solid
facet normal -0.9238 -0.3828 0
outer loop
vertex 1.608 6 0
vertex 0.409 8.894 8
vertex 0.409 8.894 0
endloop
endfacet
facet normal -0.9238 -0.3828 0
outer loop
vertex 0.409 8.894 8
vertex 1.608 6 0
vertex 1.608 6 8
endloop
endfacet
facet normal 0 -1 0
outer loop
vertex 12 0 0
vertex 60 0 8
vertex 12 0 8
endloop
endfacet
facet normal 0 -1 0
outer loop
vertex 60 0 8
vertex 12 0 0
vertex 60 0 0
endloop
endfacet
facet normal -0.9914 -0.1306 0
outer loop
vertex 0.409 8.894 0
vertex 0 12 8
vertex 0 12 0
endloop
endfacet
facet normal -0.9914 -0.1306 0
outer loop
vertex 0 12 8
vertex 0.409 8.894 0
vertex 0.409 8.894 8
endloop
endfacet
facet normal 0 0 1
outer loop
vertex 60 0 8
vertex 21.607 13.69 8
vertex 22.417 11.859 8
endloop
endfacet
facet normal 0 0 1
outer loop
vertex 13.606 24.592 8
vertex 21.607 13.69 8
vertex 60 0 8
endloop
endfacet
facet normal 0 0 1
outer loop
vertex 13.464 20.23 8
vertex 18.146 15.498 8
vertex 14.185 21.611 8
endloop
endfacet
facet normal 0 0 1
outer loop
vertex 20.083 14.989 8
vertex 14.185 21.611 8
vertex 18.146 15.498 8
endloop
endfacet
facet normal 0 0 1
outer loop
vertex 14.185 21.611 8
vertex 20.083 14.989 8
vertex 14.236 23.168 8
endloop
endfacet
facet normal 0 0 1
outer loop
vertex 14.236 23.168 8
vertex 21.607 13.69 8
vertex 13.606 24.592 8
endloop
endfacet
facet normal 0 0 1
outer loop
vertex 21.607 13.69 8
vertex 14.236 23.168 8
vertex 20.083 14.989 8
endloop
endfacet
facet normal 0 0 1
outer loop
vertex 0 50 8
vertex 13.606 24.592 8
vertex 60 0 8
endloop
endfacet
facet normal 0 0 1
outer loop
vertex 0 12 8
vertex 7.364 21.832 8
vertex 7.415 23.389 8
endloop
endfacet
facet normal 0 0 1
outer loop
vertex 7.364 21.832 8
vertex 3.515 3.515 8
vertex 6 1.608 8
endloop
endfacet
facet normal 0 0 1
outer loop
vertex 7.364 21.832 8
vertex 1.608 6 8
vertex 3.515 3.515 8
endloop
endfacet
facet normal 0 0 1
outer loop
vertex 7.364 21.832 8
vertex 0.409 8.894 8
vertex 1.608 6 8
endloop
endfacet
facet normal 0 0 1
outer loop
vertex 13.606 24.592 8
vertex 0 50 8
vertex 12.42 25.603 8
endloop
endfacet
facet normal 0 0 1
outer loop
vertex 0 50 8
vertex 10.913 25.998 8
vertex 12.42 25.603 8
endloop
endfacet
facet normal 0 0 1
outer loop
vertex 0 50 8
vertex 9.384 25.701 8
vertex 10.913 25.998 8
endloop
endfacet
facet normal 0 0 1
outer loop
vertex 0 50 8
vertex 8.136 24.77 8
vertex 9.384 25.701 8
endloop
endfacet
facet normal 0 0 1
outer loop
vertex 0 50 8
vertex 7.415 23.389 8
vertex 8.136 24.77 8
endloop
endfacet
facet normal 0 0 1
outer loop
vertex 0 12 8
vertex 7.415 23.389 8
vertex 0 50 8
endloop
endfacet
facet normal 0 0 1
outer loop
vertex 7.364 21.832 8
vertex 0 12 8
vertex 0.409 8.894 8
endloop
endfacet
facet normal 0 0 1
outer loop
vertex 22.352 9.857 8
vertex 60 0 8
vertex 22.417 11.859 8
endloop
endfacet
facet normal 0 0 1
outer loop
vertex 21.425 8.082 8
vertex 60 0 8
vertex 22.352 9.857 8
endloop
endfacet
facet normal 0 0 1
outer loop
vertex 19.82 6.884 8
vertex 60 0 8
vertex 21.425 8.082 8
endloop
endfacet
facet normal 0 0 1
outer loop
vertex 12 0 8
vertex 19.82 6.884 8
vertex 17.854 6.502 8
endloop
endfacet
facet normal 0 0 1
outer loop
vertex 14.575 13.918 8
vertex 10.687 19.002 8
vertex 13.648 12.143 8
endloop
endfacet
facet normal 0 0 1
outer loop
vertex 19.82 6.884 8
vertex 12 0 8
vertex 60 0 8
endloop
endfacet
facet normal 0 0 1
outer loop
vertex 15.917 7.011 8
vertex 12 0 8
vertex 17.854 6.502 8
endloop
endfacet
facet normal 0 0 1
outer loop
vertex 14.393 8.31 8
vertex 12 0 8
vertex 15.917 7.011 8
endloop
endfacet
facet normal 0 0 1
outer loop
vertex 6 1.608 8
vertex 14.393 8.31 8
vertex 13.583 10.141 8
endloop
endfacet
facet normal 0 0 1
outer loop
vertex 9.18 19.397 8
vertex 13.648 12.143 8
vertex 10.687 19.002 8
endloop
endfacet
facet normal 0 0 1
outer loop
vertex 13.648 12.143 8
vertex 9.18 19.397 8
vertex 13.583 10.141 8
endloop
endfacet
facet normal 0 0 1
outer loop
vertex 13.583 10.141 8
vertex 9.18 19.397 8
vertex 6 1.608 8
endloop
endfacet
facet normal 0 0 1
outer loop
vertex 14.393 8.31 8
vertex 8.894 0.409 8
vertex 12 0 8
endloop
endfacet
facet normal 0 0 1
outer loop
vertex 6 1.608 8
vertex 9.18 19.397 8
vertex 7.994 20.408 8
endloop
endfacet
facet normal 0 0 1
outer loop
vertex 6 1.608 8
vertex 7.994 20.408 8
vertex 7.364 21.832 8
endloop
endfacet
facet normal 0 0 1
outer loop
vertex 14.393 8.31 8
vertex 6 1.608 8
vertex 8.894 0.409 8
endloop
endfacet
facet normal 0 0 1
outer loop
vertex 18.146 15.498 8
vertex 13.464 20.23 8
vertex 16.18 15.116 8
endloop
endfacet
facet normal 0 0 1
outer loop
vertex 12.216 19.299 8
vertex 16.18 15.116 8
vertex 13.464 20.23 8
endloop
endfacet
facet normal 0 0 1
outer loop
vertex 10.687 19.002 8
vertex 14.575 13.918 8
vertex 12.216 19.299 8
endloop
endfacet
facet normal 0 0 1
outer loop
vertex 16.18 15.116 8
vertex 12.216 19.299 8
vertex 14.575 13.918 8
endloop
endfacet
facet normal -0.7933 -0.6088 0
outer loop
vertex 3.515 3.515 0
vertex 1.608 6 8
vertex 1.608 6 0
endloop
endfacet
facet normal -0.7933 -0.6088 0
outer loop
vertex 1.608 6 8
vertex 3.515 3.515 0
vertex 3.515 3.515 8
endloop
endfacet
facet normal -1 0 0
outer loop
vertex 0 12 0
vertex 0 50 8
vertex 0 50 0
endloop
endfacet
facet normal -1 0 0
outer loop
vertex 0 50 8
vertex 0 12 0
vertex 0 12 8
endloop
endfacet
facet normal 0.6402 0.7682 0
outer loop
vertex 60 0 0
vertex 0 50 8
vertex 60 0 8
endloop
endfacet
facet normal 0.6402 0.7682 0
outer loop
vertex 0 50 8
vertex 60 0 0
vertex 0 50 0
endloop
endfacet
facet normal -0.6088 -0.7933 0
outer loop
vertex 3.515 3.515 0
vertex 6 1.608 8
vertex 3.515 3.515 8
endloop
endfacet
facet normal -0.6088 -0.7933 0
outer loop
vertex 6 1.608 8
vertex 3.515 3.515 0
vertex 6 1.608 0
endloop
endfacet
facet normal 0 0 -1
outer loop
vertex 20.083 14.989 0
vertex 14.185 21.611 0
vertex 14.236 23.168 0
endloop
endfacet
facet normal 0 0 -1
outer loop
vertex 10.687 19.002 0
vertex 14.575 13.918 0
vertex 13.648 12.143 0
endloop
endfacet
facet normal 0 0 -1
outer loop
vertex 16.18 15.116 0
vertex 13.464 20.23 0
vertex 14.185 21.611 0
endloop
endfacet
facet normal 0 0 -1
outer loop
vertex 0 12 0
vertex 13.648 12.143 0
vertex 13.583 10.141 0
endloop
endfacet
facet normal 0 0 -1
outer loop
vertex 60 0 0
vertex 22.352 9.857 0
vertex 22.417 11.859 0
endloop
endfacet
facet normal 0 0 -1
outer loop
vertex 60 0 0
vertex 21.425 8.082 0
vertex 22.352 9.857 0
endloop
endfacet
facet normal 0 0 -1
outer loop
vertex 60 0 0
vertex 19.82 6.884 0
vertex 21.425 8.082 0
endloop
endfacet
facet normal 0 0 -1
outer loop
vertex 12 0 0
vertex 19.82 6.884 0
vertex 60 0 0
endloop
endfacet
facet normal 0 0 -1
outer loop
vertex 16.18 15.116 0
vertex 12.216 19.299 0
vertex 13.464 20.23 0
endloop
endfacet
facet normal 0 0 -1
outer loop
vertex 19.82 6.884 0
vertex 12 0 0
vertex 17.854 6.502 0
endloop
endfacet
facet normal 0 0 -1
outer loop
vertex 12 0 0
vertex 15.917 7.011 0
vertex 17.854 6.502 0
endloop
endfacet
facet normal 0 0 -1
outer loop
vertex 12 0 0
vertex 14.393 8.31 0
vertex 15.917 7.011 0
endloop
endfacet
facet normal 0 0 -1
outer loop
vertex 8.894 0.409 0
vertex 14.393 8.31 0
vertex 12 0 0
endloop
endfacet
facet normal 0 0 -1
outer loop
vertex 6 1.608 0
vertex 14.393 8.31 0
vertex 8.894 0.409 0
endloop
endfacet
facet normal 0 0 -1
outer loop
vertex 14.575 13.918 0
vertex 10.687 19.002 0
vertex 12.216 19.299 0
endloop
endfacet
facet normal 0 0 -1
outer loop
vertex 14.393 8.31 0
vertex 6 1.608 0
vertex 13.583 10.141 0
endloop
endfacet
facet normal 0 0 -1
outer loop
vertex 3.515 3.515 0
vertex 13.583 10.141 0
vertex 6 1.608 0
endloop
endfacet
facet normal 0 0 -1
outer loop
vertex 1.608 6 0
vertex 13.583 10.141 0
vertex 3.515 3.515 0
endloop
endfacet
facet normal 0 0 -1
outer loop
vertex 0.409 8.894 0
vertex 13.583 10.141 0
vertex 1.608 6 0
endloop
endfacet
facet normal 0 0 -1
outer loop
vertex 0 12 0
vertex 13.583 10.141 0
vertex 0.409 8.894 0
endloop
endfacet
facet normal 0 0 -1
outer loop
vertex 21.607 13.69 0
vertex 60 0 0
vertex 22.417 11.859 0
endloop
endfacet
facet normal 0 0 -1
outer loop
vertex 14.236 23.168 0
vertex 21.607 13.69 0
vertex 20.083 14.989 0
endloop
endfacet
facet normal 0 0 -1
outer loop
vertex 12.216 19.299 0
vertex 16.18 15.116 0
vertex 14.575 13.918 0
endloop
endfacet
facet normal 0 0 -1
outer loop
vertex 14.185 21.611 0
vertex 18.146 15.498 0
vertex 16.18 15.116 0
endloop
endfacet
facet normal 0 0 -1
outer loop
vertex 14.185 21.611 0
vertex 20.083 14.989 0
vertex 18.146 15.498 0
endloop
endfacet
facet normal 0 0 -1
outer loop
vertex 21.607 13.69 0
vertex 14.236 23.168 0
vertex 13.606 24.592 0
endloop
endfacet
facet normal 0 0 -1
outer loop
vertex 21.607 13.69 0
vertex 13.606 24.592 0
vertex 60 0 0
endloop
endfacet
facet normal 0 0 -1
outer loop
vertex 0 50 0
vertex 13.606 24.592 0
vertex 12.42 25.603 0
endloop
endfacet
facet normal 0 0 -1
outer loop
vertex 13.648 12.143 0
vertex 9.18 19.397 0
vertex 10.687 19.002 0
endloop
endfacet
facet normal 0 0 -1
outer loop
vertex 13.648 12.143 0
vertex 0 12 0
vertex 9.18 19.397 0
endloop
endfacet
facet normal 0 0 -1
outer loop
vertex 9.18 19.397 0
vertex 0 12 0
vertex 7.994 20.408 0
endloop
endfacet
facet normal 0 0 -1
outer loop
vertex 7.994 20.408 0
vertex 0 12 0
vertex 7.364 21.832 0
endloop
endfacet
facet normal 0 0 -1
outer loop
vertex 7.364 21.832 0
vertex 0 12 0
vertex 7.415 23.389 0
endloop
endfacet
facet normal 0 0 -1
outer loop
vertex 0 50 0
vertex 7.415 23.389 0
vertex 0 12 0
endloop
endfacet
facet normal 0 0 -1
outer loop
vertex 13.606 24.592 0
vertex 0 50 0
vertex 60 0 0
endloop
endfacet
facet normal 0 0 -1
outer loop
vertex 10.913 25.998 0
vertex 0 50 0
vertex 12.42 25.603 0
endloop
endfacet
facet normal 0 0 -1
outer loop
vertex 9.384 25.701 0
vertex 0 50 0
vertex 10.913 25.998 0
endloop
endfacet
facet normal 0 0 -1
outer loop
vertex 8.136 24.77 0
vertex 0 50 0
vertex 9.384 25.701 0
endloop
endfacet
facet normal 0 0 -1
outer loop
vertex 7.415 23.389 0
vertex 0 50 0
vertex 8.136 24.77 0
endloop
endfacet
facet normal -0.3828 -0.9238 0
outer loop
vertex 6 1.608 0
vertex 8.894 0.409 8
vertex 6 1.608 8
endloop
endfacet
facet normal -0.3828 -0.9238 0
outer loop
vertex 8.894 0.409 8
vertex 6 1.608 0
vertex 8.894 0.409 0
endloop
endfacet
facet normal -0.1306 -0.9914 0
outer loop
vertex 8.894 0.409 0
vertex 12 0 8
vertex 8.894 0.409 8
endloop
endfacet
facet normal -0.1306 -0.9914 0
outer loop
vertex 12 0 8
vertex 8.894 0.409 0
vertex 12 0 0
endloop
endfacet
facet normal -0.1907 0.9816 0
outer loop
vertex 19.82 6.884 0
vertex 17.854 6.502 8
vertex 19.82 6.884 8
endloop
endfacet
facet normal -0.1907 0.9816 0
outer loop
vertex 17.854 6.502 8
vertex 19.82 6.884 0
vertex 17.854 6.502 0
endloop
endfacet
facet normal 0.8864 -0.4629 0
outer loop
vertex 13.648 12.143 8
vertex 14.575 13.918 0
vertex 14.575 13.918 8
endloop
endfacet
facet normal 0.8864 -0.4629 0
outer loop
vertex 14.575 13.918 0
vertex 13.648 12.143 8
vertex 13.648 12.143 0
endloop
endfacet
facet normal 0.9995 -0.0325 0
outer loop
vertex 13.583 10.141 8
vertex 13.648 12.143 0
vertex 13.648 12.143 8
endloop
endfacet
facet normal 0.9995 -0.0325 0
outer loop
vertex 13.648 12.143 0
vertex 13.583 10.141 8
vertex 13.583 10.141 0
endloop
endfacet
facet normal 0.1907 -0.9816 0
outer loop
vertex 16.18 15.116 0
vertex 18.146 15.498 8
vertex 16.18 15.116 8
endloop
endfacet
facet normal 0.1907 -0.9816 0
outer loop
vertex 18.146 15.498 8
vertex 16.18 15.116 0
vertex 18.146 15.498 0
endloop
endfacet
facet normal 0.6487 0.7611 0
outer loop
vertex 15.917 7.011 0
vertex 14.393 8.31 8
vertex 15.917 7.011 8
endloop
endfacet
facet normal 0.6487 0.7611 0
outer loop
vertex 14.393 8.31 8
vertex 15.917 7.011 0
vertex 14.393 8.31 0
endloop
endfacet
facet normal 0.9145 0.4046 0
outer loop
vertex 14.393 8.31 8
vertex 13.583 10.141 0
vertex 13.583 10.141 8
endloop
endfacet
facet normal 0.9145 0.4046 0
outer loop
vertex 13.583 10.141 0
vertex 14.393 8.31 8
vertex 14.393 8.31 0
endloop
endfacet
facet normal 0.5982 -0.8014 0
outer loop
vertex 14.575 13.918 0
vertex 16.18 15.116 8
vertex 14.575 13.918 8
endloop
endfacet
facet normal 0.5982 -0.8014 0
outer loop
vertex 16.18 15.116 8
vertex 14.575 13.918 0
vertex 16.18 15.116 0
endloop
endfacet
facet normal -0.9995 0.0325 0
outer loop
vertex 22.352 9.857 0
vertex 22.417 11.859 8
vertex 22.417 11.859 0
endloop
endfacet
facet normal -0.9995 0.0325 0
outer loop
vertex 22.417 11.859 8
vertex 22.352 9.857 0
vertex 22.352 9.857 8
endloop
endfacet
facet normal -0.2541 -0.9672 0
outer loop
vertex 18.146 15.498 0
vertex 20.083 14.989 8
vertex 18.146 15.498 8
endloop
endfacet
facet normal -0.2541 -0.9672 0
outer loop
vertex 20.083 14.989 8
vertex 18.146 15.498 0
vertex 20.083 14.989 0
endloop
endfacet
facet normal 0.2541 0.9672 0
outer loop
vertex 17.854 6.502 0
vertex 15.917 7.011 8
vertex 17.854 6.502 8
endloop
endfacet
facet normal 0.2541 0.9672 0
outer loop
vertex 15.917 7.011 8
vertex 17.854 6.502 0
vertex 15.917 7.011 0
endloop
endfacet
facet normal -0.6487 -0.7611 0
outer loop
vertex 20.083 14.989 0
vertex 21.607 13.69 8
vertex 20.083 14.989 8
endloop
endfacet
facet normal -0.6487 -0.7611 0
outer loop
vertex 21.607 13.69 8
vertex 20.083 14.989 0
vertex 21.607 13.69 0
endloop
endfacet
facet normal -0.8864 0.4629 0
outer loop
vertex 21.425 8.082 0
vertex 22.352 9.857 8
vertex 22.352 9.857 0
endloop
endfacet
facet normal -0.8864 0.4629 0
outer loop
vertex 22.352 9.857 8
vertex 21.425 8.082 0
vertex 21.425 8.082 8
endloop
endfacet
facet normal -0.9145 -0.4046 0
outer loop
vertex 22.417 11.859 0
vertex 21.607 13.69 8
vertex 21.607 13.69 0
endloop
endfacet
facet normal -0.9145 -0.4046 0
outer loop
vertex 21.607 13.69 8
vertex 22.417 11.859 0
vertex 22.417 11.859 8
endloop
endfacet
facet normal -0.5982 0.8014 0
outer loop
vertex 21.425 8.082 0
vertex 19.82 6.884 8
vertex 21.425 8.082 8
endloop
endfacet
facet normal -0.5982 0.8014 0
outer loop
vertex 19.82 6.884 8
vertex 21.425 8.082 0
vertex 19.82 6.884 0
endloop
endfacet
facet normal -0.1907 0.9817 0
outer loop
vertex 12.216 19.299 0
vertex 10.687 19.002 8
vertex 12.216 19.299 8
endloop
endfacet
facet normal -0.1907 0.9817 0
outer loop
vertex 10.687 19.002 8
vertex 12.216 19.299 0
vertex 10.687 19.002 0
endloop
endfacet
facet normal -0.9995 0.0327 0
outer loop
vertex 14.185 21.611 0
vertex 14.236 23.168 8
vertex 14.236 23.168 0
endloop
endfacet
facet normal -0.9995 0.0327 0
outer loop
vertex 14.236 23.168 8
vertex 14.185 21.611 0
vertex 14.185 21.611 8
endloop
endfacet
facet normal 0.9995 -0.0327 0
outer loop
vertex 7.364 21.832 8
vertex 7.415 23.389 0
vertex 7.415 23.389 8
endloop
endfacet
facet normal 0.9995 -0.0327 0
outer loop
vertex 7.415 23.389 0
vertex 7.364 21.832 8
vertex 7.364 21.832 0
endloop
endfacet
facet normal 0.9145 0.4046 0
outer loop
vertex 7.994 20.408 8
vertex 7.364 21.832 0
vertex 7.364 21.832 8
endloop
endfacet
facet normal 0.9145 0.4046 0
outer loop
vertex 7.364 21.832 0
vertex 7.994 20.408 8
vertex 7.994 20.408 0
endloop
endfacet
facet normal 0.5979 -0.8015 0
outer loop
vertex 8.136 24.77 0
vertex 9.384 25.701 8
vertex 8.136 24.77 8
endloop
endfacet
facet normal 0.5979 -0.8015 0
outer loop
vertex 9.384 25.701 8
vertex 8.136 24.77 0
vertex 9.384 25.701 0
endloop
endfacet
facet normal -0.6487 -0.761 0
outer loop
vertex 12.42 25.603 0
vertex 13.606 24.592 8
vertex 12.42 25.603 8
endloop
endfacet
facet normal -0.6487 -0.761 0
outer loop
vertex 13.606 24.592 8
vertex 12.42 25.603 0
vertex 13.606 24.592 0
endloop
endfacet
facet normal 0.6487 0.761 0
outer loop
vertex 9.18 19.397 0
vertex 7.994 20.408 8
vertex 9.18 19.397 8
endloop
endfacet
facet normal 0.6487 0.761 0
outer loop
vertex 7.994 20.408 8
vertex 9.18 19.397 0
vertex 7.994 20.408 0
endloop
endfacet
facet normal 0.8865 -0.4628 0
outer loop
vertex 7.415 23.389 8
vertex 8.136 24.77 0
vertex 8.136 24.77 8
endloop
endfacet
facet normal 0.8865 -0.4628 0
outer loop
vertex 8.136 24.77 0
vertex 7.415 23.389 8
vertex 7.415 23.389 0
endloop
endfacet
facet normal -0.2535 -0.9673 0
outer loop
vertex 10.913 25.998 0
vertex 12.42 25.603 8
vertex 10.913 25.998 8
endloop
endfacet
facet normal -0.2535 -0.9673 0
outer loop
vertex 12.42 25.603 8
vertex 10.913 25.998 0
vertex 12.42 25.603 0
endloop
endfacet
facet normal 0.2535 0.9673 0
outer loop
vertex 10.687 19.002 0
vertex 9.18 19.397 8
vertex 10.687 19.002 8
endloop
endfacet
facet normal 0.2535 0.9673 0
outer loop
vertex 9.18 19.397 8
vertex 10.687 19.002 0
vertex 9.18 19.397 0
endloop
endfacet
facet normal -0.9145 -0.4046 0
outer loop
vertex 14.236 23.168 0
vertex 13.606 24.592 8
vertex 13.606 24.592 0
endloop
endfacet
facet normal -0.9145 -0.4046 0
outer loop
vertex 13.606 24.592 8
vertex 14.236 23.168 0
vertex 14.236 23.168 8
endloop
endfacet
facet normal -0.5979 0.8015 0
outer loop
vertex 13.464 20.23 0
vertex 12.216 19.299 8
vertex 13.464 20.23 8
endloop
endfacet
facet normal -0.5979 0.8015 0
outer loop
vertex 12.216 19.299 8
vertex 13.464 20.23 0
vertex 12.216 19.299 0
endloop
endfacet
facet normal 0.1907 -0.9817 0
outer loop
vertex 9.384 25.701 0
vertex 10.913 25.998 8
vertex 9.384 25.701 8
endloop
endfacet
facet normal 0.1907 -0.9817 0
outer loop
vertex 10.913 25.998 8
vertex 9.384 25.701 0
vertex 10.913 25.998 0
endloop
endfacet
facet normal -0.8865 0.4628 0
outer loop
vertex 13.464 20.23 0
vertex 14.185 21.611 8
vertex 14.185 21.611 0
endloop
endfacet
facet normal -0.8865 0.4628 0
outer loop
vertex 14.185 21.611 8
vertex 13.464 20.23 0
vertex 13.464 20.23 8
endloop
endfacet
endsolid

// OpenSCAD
$fn = 32;

// ----------------------------------------------------------------------
// Bracket plate: corner pad 60 x 50, fillet R12
// ----------------------------------------------------------------------

// --- parameters (mm) ---
hole_r = 3.5;             // bolt hole radius
plate_t = 8;              // plate thickness, Z (extrusion height)
leg_a = 60;               // base leg
leg_b = 50;               // height leg
fillet_r = 12;            // right-angle fillet radius
fit_tol = 0.05;           // declared fit tolerance (prompt contract)
free_tol = 0.3;           // declared free tolerance (prompt contract)

hole_d1 = 2 * hole_r + 2;
hole_d2 = 2 * hole_r;

profile = [[12, 0], [60, 0], [0, 50], [0, 12], [0.409, 8.894], [1.608, 6], [3.515, 3.515], [6, 1.608], [8.894, 0.409]];  // primary outline, 9 points, counter clockwise
void_1 = [[22.417, 11.859], [21.607, 13.69], [20.083, 14.989], [18.146, 15.498], [16.18, 15.116], [14.575, 13.918], [13.648, 12.143], [13.583, 10.141], [14.393, 8.31], [15.917, 7.011], [17.854, 6.502], [19.82, 6.884], [21.425, 8.082], [22.352, 9.857]];  // mount hole 1, 14 points
void_2 = [[14.236, 23.168], [13.606, 24.592], [12.42, 25.603], [10.913, 25.998], [9.384, 25.701], [8.136, 24.77], [7.415, 23.389], [7.364, 21.832], [7.994, 20.408], [9.18, 19.397], [10.687, 19.002], [12.216, 19.299], [13.464, 20.23], [14.185, 21.611]];  // mount hole 2, 14 points

// --- the one profile operation ---
difference() {
  linear_extrude(height = plate_t) polygon(points = profile);
  translate([0, 0, -1])
    linear_extrude(height = plate_t + 2) polygon(points = void_1);
  translate([0, 0, -1])
    linear_extrude(height = plate_t + 2) polygon(points = void_2);
}
